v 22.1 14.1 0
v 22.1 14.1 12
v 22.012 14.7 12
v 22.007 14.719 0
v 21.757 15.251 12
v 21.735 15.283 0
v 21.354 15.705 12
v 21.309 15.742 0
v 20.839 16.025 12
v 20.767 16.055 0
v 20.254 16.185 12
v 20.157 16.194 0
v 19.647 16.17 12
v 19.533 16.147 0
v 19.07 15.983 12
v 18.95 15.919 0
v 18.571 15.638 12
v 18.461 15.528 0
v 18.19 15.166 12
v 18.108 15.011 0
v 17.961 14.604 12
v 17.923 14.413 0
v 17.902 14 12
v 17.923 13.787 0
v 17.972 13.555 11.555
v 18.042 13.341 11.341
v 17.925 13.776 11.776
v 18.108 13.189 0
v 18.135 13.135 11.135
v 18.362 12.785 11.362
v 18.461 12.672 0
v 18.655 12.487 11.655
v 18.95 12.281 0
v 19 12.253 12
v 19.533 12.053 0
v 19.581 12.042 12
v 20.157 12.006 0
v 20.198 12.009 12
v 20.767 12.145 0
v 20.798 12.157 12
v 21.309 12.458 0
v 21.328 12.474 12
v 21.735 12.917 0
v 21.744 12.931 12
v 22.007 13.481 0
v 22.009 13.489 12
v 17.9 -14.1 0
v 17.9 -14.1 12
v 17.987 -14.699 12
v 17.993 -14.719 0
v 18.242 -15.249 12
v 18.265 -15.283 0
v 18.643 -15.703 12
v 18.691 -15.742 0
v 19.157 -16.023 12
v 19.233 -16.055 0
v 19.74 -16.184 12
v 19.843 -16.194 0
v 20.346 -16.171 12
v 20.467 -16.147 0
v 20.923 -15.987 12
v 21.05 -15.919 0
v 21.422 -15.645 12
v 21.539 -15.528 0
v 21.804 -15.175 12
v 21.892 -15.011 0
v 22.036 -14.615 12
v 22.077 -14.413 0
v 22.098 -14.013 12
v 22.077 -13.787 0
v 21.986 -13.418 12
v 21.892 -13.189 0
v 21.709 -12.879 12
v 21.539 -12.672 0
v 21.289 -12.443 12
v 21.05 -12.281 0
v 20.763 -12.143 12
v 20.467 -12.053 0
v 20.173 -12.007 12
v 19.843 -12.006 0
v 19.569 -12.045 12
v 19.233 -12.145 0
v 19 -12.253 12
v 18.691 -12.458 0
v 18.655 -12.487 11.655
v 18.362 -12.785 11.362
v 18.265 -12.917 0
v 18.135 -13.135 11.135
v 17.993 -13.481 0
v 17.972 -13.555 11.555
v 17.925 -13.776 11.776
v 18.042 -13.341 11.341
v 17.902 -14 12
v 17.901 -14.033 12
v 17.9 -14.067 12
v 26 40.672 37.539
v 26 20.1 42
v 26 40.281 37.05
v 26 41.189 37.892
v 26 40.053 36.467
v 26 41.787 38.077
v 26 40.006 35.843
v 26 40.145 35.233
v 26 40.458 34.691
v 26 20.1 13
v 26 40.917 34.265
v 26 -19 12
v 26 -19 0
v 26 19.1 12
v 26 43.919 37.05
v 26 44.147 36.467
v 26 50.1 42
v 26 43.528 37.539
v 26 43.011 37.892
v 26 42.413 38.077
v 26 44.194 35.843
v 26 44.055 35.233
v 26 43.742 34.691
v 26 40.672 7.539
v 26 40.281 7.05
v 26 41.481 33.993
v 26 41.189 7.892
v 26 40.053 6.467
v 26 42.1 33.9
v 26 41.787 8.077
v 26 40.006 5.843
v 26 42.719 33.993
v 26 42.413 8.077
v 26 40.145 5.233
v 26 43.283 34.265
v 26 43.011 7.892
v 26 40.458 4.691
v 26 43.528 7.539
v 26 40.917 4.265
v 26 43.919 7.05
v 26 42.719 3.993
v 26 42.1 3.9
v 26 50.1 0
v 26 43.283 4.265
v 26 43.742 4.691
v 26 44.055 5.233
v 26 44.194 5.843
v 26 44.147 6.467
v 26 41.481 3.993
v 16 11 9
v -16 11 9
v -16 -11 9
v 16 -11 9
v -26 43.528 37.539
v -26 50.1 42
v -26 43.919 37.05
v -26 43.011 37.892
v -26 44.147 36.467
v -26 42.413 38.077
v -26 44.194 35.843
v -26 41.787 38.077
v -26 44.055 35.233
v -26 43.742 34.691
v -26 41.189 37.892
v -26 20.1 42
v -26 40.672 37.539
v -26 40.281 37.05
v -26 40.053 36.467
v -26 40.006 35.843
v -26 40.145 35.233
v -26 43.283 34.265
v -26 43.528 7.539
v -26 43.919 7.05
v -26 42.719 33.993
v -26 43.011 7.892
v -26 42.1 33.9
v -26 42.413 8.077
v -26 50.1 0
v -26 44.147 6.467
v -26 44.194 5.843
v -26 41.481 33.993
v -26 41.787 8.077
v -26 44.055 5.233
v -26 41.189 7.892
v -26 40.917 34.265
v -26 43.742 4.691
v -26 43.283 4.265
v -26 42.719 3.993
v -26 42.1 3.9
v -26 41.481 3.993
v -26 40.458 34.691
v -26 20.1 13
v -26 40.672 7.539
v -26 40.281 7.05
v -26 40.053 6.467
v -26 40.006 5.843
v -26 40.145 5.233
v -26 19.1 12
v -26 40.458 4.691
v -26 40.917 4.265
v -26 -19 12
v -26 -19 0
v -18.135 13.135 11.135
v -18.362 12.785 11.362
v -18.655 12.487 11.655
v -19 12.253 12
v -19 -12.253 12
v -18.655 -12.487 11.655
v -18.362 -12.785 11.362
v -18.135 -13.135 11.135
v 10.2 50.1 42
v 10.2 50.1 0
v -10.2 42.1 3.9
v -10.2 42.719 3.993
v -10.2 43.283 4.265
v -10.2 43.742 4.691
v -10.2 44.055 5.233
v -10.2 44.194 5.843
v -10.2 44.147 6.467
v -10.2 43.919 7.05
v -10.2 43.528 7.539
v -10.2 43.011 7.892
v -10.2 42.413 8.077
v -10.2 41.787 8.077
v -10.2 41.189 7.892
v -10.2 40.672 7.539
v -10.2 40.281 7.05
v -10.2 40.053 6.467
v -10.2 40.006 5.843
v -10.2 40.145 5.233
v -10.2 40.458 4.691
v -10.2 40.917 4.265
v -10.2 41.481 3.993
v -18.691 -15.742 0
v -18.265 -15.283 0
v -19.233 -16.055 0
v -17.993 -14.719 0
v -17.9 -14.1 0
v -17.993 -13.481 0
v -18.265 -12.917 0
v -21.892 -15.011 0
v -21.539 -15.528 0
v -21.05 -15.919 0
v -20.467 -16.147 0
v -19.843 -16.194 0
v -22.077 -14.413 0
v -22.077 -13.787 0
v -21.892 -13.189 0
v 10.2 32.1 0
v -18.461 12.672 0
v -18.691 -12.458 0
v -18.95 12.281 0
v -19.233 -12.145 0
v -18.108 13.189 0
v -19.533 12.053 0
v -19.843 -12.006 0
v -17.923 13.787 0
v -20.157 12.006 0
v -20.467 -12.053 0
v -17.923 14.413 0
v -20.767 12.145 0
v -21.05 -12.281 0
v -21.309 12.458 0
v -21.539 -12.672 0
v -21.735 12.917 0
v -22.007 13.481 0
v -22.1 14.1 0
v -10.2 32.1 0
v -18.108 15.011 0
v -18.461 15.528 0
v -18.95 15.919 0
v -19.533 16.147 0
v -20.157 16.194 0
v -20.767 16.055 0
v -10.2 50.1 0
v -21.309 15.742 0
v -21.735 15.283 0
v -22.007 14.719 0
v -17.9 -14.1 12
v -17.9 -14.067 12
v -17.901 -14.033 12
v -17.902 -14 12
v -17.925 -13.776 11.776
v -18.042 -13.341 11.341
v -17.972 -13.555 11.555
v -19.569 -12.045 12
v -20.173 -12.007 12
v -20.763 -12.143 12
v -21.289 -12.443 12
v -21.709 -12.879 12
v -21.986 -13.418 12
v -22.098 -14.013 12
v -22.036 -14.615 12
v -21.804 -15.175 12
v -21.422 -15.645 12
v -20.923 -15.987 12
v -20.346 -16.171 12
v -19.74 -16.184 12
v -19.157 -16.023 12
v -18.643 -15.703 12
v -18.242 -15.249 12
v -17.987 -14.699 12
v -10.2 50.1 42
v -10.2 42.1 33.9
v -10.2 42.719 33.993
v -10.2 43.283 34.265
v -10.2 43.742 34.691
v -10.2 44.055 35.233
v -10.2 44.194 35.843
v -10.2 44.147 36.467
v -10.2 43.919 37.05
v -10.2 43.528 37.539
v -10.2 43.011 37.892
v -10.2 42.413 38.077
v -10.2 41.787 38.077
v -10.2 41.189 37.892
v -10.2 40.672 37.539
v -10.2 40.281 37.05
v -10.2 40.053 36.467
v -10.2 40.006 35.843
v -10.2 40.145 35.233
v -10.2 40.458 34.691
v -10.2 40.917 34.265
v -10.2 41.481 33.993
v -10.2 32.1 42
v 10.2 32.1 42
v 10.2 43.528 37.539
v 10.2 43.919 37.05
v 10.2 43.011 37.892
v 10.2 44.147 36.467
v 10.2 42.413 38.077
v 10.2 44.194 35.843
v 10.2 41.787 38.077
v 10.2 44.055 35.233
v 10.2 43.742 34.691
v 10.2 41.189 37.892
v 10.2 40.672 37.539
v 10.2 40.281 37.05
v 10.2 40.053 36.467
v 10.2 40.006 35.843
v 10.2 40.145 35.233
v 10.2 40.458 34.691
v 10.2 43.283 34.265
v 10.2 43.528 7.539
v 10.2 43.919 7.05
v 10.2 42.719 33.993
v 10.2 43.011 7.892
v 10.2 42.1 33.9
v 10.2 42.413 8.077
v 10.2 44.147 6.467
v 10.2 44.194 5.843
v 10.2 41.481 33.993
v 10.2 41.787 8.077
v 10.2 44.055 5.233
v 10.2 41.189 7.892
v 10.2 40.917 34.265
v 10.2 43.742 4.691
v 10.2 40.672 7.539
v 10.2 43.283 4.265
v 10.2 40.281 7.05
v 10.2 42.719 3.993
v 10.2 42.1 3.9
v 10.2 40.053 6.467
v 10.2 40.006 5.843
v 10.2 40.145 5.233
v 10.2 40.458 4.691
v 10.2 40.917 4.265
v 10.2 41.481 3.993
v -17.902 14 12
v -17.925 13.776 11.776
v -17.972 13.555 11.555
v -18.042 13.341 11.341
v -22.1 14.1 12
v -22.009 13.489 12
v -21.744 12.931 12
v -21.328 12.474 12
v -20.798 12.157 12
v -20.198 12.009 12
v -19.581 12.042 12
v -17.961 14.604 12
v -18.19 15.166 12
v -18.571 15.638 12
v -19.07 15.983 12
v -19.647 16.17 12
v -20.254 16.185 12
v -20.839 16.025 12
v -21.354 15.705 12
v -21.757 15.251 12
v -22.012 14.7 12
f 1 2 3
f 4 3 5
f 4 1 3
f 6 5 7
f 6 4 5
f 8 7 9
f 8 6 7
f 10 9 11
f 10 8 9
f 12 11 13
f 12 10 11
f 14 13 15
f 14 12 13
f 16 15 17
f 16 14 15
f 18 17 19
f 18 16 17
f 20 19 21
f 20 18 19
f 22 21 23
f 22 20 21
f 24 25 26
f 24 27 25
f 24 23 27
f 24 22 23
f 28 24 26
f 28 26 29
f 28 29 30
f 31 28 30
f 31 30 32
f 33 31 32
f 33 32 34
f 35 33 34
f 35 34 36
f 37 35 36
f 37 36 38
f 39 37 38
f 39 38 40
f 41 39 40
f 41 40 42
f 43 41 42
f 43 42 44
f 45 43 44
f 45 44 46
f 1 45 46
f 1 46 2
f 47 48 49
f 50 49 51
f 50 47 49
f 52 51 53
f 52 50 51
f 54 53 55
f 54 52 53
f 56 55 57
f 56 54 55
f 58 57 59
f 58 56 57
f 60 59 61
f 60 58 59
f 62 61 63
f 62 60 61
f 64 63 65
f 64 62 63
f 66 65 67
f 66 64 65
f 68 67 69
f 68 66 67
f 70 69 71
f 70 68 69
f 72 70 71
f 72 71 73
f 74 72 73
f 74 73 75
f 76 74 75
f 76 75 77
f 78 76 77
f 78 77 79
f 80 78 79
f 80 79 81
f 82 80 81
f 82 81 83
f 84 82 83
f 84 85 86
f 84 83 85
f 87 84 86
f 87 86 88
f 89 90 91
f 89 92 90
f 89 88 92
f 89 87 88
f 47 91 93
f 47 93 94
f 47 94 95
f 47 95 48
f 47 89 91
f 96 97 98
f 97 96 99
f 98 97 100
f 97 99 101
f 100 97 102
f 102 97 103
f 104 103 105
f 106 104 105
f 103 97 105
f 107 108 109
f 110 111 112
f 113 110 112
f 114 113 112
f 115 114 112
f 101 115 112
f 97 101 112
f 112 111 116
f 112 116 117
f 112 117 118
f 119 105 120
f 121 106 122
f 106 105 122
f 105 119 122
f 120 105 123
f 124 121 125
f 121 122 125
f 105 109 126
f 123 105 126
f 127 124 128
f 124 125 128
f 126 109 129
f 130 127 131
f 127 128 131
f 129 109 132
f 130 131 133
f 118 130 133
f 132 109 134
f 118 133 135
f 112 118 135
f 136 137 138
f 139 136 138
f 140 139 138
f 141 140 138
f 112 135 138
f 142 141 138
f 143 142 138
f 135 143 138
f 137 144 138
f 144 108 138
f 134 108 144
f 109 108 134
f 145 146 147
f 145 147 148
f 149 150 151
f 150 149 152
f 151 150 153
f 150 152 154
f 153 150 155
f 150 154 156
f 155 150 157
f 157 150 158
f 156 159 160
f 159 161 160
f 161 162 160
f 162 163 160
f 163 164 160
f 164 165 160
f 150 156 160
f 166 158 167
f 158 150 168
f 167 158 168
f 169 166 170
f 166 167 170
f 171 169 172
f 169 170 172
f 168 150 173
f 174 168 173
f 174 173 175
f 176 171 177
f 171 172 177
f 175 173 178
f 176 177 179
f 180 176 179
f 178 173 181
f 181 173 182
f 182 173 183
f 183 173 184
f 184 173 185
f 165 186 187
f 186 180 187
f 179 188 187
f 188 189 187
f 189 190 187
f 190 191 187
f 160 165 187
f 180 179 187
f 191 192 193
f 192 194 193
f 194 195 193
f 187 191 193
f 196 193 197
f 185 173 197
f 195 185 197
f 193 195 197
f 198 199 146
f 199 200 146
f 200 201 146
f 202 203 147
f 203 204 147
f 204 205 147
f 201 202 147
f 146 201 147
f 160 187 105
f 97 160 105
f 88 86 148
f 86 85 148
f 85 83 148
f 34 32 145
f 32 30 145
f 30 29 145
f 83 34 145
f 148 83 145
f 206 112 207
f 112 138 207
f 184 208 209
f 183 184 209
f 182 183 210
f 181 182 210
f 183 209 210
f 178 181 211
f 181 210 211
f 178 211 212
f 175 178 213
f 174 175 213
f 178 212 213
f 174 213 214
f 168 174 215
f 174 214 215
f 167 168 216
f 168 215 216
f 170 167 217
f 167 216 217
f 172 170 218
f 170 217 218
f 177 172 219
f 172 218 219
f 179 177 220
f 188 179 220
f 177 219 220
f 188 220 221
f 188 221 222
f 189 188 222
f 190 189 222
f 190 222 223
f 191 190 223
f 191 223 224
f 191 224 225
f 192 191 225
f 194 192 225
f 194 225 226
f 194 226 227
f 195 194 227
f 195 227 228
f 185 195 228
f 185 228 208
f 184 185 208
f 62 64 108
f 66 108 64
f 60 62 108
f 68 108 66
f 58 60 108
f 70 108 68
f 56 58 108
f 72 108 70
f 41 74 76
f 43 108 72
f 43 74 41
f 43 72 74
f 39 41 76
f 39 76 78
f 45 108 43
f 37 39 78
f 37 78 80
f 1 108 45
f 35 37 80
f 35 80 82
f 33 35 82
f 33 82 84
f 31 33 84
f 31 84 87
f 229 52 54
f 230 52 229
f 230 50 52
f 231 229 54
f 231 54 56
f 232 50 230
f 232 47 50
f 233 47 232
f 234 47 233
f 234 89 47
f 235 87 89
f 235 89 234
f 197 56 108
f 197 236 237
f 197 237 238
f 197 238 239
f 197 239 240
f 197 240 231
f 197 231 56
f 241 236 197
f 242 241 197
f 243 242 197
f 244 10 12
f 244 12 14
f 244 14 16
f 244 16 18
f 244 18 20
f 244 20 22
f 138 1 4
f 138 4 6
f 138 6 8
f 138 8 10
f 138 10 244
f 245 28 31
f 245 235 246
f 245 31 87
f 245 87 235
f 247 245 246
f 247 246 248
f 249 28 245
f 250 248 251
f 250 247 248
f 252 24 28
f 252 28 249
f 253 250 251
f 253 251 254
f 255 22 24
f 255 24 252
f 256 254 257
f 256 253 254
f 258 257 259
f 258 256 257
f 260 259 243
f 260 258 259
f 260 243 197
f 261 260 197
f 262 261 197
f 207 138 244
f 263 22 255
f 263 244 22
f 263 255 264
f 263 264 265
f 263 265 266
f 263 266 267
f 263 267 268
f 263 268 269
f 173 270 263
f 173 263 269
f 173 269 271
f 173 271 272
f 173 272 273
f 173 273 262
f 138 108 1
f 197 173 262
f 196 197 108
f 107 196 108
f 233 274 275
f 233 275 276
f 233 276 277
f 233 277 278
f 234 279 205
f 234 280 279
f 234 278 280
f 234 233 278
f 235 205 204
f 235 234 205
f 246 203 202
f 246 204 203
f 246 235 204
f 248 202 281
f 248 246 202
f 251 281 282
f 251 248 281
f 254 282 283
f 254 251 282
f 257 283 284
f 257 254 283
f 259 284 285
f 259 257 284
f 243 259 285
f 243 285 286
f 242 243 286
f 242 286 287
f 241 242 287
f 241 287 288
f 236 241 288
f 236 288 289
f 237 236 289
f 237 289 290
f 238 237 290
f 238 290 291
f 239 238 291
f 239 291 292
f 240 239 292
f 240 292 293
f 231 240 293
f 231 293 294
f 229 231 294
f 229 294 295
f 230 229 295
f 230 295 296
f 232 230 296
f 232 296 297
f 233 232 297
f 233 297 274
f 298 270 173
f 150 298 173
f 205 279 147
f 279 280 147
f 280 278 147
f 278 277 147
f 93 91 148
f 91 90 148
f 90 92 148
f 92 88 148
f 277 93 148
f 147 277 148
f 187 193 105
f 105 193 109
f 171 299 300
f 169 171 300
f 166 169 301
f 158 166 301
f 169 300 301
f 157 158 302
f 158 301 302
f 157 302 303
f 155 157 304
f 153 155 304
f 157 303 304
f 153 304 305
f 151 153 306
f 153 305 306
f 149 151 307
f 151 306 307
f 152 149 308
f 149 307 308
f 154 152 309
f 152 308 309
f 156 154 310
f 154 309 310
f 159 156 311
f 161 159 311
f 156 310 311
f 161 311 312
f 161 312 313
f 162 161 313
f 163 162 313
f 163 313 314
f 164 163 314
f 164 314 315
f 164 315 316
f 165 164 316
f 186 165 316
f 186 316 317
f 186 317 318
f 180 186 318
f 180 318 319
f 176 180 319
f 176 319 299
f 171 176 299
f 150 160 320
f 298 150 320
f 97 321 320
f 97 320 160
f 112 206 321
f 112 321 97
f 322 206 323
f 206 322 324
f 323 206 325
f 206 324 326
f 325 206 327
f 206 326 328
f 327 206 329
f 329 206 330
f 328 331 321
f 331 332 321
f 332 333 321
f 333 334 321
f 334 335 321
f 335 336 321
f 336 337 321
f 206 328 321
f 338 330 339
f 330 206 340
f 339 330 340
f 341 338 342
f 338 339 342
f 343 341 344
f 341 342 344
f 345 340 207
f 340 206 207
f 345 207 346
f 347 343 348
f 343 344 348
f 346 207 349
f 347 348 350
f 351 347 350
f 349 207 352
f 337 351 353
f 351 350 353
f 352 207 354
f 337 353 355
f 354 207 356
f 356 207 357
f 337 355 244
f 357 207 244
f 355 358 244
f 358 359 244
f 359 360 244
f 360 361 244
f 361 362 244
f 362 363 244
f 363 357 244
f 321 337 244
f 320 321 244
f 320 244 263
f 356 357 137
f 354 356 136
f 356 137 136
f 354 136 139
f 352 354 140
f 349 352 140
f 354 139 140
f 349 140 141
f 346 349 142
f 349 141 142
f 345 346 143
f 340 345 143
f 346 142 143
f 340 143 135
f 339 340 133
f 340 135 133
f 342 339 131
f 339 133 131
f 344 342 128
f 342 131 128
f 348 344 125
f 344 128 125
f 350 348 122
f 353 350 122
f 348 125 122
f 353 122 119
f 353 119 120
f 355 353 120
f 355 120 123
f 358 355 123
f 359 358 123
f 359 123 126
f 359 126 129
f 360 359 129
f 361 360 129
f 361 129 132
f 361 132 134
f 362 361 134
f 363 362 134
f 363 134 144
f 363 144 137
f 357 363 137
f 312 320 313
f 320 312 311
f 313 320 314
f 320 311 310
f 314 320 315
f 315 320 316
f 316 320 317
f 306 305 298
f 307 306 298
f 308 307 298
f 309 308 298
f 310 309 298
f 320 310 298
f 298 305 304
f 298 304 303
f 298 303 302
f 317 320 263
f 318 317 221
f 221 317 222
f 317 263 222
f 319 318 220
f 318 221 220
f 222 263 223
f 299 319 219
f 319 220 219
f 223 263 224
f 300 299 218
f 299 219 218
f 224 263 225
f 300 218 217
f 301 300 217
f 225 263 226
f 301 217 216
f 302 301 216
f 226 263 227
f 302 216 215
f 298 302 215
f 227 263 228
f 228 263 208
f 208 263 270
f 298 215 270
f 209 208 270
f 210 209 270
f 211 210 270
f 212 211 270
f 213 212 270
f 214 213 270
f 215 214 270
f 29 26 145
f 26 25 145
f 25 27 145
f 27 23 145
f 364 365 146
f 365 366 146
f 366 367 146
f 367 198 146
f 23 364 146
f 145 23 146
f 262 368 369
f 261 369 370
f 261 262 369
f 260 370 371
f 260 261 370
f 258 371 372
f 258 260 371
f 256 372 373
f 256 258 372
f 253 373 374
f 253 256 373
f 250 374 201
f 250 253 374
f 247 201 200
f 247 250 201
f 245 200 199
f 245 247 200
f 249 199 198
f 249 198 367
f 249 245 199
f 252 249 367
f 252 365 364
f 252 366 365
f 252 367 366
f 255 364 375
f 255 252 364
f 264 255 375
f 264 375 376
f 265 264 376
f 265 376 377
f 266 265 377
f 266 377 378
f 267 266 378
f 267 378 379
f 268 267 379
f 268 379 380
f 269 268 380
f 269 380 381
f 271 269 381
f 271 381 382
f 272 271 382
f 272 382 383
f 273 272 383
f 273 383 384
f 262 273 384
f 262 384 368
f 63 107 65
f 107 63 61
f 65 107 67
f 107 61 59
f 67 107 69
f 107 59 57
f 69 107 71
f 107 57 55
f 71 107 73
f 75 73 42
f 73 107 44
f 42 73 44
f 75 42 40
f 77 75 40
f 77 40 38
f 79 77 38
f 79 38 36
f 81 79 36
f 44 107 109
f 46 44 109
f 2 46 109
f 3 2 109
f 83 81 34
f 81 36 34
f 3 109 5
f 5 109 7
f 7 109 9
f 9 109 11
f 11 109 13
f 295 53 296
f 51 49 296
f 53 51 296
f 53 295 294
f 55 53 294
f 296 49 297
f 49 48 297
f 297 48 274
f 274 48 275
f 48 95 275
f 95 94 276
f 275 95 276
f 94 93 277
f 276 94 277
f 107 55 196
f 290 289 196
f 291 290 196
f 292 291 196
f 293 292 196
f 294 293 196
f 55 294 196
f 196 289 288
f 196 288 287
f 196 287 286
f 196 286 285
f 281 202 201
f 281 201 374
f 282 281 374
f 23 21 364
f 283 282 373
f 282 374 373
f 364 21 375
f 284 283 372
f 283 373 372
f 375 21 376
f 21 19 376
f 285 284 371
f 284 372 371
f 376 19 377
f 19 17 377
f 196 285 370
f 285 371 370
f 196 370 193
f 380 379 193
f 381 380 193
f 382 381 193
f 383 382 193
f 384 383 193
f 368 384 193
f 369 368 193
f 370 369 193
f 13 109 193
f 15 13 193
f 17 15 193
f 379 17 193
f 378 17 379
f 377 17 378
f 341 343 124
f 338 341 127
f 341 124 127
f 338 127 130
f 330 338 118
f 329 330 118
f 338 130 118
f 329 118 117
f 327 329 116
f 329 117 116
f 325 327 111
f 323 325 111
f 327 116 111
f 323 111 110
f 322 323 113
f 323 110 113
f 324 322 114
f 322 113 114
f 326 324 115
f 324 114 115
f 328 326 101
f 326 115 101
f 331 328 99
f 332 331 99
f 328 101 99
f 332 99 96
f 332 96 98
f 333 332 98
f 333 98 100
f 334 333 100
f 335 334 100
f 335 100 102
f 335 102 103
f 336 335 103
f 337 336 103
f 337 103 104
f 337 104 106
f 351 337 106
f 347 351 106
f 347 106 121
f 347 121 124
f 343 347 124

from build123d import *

# Parameters (mm, degrees)
SZKIC1_W                    = 52
SZKIC1_H                    = 38
SZKIC1_R                    = 2.1
DODANIE_WYCI_GNI_CIE1_DEPTH = 12
SZKIC2_W                    = 32
SZKIC2_H                    = 22
WYTNIJ_WYCI_GNI_CIE1_DEPTH  = 3
SFAZOWANIE1_SIZE            = 3
DODANIE_WYCI_GNI_CIE2_DEPTH = 12
DODANIE_WYCI_GNI_CIE3_DEPTH = 30
SFAZOWANIE2_SIZE            = 1
SZKIC6_R                    = 2.1
WYTNIJ_WYCI_GNI_CIE2_DEPTH  = 84.534483897


with BuildPart() as part:
    # Szkic1 → Dodanie-wyciągnięcie1 (new body)
    with BuildSketch(Plane.XY):
        Rectangle(SZKIC1_W, SZKIC1_H)
        with Locations((20, 14.1)):
            Circle(SZKIC1_R, mode=Mode.SUBTRACT)
        with Locations(Location((20, -14.1, 0), (0, 0, 180))):
            Circle(SZKIC1_R, mode=Mode.SUBTRACT)
        with Locations((-20, -14.1)):
            Circle(SZKIC1_R, mode=Mode.SUBTRACT)
        with Locations(Location((-20, 14.1, 0), (0, 0, 180))):
            Circle(SZKIC1_R, mode=Mode.SUBTRACT)
    extrude(amount=DODANIE_WYCI_GNI_CIE1_DEPTH)

    # Szkic2 → Wytnij-wyciągnięcie1 (cut)
    with BuildSketch(Plane.XY.offset(12)):
        Rectangle(SZKIC2_W, SZKIC2_H)
    extrude(amount=-WYTNIJ_WYCI_GNI_CIE1_DEPTH, mode=Mode.SUBTRACT)

    # Sfazowanie1
    # the kernel refuses this chamfer: 3 mm, written as the material it takes off along each edge
    with BuildSketch(Plane(origin=(16, -11, 12), x_dir=(0, -0.9996219169112969, 0.02749587661058621), z_dir=(-1, 0, 0))) as sfazowanie1_piece_1_section:
        Polygon((SFAZOWANIE1_SIZE * 0.999621916911, -SFAZOWANIE1_SIZE * 0.0274958766106), (-SFAZOWANIE1_SIZE * 0.0274958766106, -SFAZOWANIE1_SIZE * 0.999621916911), (0, 0), align=None)
    sfazowanie1_piece_1 = extrude(amount=32, mode=Mode.PRIVATE)
    sfazowanie1_piece_1 = split(sfazowanie1_piece_1, bisect_by=Plane(origin=(0, -11.991212463, 9), z_dir=(0, 0, 1)), keep=Keep.TOP, mode=Mode.PRIVATE)
    add(sfazowanie1_piece_1, mode=Mode.SUBTRACT)
    with BuildSketch(Plane(origin=(16, 11, 12), x_dir=(0.9996219169112968, 0, 0.02749587661058619), z_dir=(0, -1, 0))) as sfazowanie1_piece_2_section:
        Polygon((SFAZOWANIE1_SIZE * 0.999621916911, -SFAZOWANIE1_SIZE * 0.0274958766106), (-SFAZOWANIE1_SIZE * 0.0274958766106, -SFAZOWANIE1_SIZE * 0.999621916911), (0, 0), align=None)
    sfazowanie1_piece_2 = extrude(amount=22, mode=Mode.PRIVATE)
    sfazowanie1_piece_2 = split(sfazowanie1_piece_2, bisect_by=Plane(origin=(16.991212463, 0, 9), z_dir=(0, 0, 1)), keep=Keep.TOP, mode=Mode.PRIVATE)
    add(sfazowanie1_piece_2, mode=Mode.SUBTRACT)
    with BuildSketch(Plane(origin=(-16, -11, 12), x_dir=(-0.9996219169112968, 0, 0.02749587661058619), z_dir=(0, 1, 0))) as sfazowanie1_piece_3_section:
        Polygon((SFAZOWANIE1_SIZE * 0.999621916911, -SFAZOWANIE1_SIZE * 0.0274958766106), (-SFAZOWANIE1_SIZE * 0.0274958766106, -SFAZOWANIE1_SIZE * 0.999621916911), (0, 0), align=None)
    sfazowanie1_piece_3 = extrude(amount=22, mode=Mode.PRIVATE)
    sfazowanie1_piece_3 = split(sfazowanie1_piece_3, bisect_by=Plane(origin=(-16.991212463, 0, 9), z_dir=(0, 0, 1)), keep=Keep.TOP, mode=Mode.PRIVATE)
    add(sfazowanie1_piece_3, mode=Mode.SUBTRACT)
    with BuildSketch(Plane(origin=(-16, 11, 12), x_dir=(0, 0.9996219169112969, 0.02749587661058621), z_dir=(1, 0, 0))) as sfazowanie1_piece_4_section:
        Polygon((SFAZOWANIE1_SIZE * 0.999621916911, -SFAZOWANIE1_SIZE * 0.0274958766106), (-SFAZOWANIE1_SIZE * 0.0274958766106, -SFAZOWANIE1_SIZE * 0.999621916911), (0, 0), align=None)
    sfazowanie1_piece_4 = extrude(amount=32, mode=Mode.PRIVATE)
    sfazowanie1_piece_4 = split(sfazowanie1_piece_4, bisect_by=Plane(origin=(0, 11.991212463, 9), z_dir=(0, 0, 1)), keep=Keep.TOP, mode=Mode.PRIVATE)
    add(sfazowanie1_piece_4, mode=Mode.SUBTRACT)
    with BuildSketch(Plane(origin=(16, 11, 12), x_dir=(0.9996219169112968, 0, 0.02749587661058619), z_dir=(0, -1, 0))) as sfazowanie1_piece_5a_section:
        Polygon((SFAZOWANIE1_SIZE * 0.999621916911, -SFAZOWANIE1_SIZE * 0.0274958766106), (-SFAZOWANIE1_SIZE * 0.0274958766106, -SFAZOWANIE1_SIZE * 0.999621916911), (0, 0), align=None)
    sfazowanie1_piece_5a = extrude(amount=29.715048964, mode=Mode.PRIVATE)
    sfazowanie1_piece_5a = split(sfazowanie1_piece_5a, bisect_by=Plane(origin=(16.991212463, -11, 11.014096999), z_dir=(0, -1, 0)), keep=Keep.TOP, mode=Mode.PRIVATE)
    sfazowanie1_piece_5a = split(sfazowanie1_piece_5a, bisect_by=Plane(origin=(16.991212463, -14.857524482, 9), z_dir=(0, 0, 1)), keep=Keep.TOP, mode=Mode.PRIVATE)
    with BuildSketch(Plane(origin=(23.715048964, -11, 12), x_dir=(0, -0.9996219169112969, 0.02749587661058621), z_dir=(-1, 0, 0))) as sfazowanie1_piece_5b_section:
        Polygon((SFAZOWANIE1_SIZE * 0.999621916911, -SFAZOWANIE1_SIZE * 0.0274958766106), (-SFAZOWANIE1_SIZE * 0.0274958766106, -SFAZOWANIE1_SIZE * 0.999621916911), (0, 0), align=None)
    sfazowanie1_piece_5b = extrude(amount=39.715048964, mode=Mode.PRIVATE)
    sfazowanie1_piece_5b = split(sfazowanie1_piece_5b, bisect_by=Plane(origin=(16, -11.991212463, 11.014096999), z_dir=(1, 0, 0)), keep=Keep.TOP, mode=Mode.PRIVATE)
    sfazowanie1_piece_5b = split(sfazowanie1_piece_5b, bisect_by=Plane(origin=(19.857524482, -11.991212463, 9), z_dir=(0, 0, 1)), keep=Keep.TOP, mode=Mode.PRIVATE)
    sfazowanie1_piece_5 = sfazowanie1_piece_5a & sfazowanie1_piece_5b
    add(sfazowanie1_piece_5, mode=Mode.SUBTRACT)
    with BuildSketch(Plane(origin=(-16, -18.715048964, 12), x_dir=(-0.9996219169112968, 0, 0.02749587661058619), z_dir=(0, 1, 0))) as sfazowanie1_piece_6a_section:
        Polygon((SFAZOWANIE1_SIZE * 0.999621916911, -SFAZOWANIE1_SIZE * 0.0274958766106), (-SFAZOWANIE1_SIZE * 0.0274958766106, -SFAZOWANIE1_SIZE * 0.999621916911), (0, 0), align=None)
    sfazowanie1_piece_6a = extrude(amount=29.715048964, mode=Mode.PRIVATE)
    sfazowanie1_piece_6a = split(sfazowanie1_piece_6a, bisect_by=Plane(origin=(-16.991212463, -11, 11.014096999), z_dir=(0, -1, 0)), keep=Keep.TOP, mode=Mode.PRIVATE)
    sfazowanie1_piece_6a = split(sfazowanie1_piece_6a, bisect_by=Plane(origin=(-16.991212463, -14.857524482, 9), z_dir=(0, 0, 1)), keep=Keep.TOP, mode=Mode.PRIVATE)
    with BuildSketch(Plane(origin=(16, -11, 12), x_dir=(0, -0.9996219169112969, 0.02749587661058621), z_dir=(-1, 0, 0))) as sfazowanie1_piece_6b_section:
        Polygon((SFAZOWANIE1_SIZE * 0.999621916911, -SFAZOWANIE1_SIZE * 0.0274958766106), (-SFAZOWANIE1_SIZE * 0.0274958766106, -SFAZOWANIE1_SIZE * 0.999621916911), (0, 0), align=None)
    sfazowanie1_piece_6b = extrude(amount=39.715048964, mode=Mode.PRIVATE)
    sfazowanie1_piece_6b = split(sfazowanie1_piece_6b, bisect_by=Plane(origin=(-16, -11.991212463, 11.014096999), z_dir=(-1, 0, 0)), keep=Keep.TOP, mode=Mode.PRIVATE)
    sfazowanie1_piece_6b = split(sfazowanie1_piece_6b, bisect_by=Plane(origin=(-19.857524482, -11.991212463, 9), z_dir=(0, 0, 1)), keep=Keep.TOP, mode=Mode.PRIVATE)
    sfazowanie1_piece_6 = sfazowanie1_piece_6a & sfazowanie1_piece_6b
    add(sfazowanie1_piece_6, mode=Mode.SUBTRACT)
    with BuildSketch(Plane(origin=(16, 18.715048964, 12), x_dir=(0.9996219169112968, 0, 0.02749587661058619), z_dir=(0, -1, 0))) as sfazowanie1_piece_7a_section:
        Polygon((SFAZOWANIE1_SIZE * 0.999621916911, -SFAZOWANIE1_SIZE * 0.0274958766106), (-SFAZOWANIE1_SIZE * 0.0274958766106, -SFAZOWANIE1_SIZE * 0.999621916911), (0, 0), align=None)
    sfazowanie1_piece_7a = extrude(amount=29.715048964, mode=Mode.PRIVATE)
    sfazowanie1_piece_7a = split(sfazowanie1_piece_7a, bisect_by=Plane(origin=(16.991212463, 11, 11.014096999), z_dir=(0, 1, 0)), keep=Keep.TOP, mode=Mode.PRIVATE)
    sfazowanie1_piece_7a = split(sfazowanie1_piece_7a, bisect_by=Plane(origin=(16.991212463, 14.857524482, 9), z_dir=(0, 0, 1)), keep=Keep.TOP, mode=Mode.PRIVATE)
    with BuildSketch(Plane(origin=(-16, 11, 12), x_dir=(0, 0.9996219169112969, 0.02749587661058621), z_dir=(1, 0, 0))) as sfazowanie1_piece_7b_section:
        Polygon((SFAZOWANIE1_SIZE * 0.999621916911, -SFAZOWANIE1_SIZE * 0.0274958766106), (-SFAZOWANIE1_SIZE * 0.0274958766106, -SFAZOWANIE1_SIZE * 0.999621916911), (0, 0), align=None)
    sfazowanie1_piece_7b = extrude(amount=39.715048964, mode=Mode.PRIVATE)
    sfazowanie1_piece_7b = split(sfazowanie1_piece_7b, bisect_by=Plane(origin=(16, 11.991212463, 11.014096999), z_dir=(1, 0, 0)), keep=Keep.TOP, mode=Mode.PRIVATE)
    sfazowanie1_piece_7b = split(sfazowanie1_piece_7b, bisect_by=Plane(origin=(19.857524482, 11.991212463, 9), z_dir=(0, 0, 1)), keep=Keep.TOP, mode=Mode.PRIVATE)
    sfazowanie1_piece_7 = sfazowanie1_piece_7a & sfazowanie1_piece_7b
    add(sfazowanie1_piece_7, mode=Mode.SUBTRACT)
    with BuildSketch(Plane(origin=(-23.715048964, 11, 12), x_dir=(0, 0.9996219169112969, 0.02749587661058621), z_dir=(1, 0, 0))) as sfazowanie1_piece_8a_section:
        Polygon((SFAZOWANIE1_SIZE * 0.999621916911, -SFAZOWANIE1_SIZE * 0.0274958766106), (-SFAZOWANIE1_SIZE * 0.0274958766106, -SFAZOWANIE1_SIZE * 0.999621916911), (0, 0), align=None)
    sfazowanie1_piece_8a = extrude(amount=39.715048964, mode=Mode.PRIVATE)
    sfazowanie1_piece_8a = split(sfazowanie1_piece_8a, bisect_by=Plane(origin=(-16, 11.991212463, 11.014096999), z_dir=(-1, 0, 0)), keep=Keep.TOP, mode=Mode.PRIVATE)
    sfazowanie1_piece_8a = split(sfazowanie1_piece_8a, bisect_by=Plane(origin=(-19.857524482, 11.991212463, 9), z_dir=(0, 0, 1)), keep=Keep.TOP, mode=Mode.PRIVATE)
    with BuildSketch(Plane(origin=(-16, -11, 12), x_dir=(-0.9996219169112968, 0, 0.02749587661058619), z_dir=(0, 1, 0))) as sfazowanie1_piece_8b_section:
        Polygon((SFAZOWANIE1_SIZE * 0.999621916911, -SFAZOWANIE1_SIZE * 0.0274958766106), (-SFAZOWANIE1_SIZE * 0.0274958766106, -SFAZOWANIE1_SIZE * 0.999621916911), (0, 0), align=None)
    sfazowanie1_piece_8b = extrude(amount=29.715048964, mode=Mode.PRIVATE)
    sfazowanie1_piece_8b = split(sfazowanie1_piece_8b, bisect_by=Plane(origin=(-16.991212463, 11, 11.014096999), z_dir=(0, 1, 0)), keep=Keep.TOP, mode=Mode.PRIVATE)
    sfazowanie1_piece_8b = split(sfazowanie1_piece_8b, bisect_by=Plane(origin=(-16.991212463, 14.857524482, 9), z_dir=(0, 0, 1)), keep=Keep.TOP, mode=Mode.PRIVATE)
    sfazowanie1_piece_8 = sfazowanie1_piece_8a & sfazowanie1_piece_8b
    add(sfazowanie1_piece_8, mode=Mode.SUBTRACT)

    # Szkic3 → Dodanie-wyciągnięcie2 (add)
    with BuildSketch(Plane.XY.offset(12)):
        Polygon((-10.2, 32.1), (10.2, 32.1), (10.2, 50.1), (26, 50.1), (26, 19), (-26, 19), (-26, 50.1), (-10.2, 50.1), align=None)
    extrude(amount=-DODANIE_WYCI_GNI_CIE2_DEPTH)

    # Szkic4 → Dodanie-wyciągnięcie3 (add)
    with BuildSketch(Plane.XY.offset(12)):
        Polygon((-26, 20.1), (26, 20.1), (26, 50.1), (10.2, 50.1), (10.2, 32.1), (-10.2, 32.1), (-10.2, 50.1), (-26, 50.1), align=None)
    extrude(amount=DODANIE_WYCI_GNI_CIE3_DEPTH)

    # Sfazowanie2
    sfazowanie2_edges = [part.edges().sort_by_distance(p)[0] for p in [
        (0, 20.1, 12),
    ]]
    chamfer(sfazowanie2_edges, length=SFAZOWANIE2_SIZE)

    # Szkic6 → Wytnij-wyciągnięcie2 (cut, through all)
    with BuildSketch(Plane(origin=(26, 0, 0), x_dir=(0, 0, -1), z_dir=(1, 0, 0))):
        with Locations((-36, 42.1)):
            Circle(SZKIC6_R)
        with Locations((-6, 42.1)):
            Circle(SZKIC6_R)
    extrude(amount=-WYTNIJ_WYCI_GNI_CIE2_DEPTH, mode=Mode.SUBTRACT)


solid = part.part
